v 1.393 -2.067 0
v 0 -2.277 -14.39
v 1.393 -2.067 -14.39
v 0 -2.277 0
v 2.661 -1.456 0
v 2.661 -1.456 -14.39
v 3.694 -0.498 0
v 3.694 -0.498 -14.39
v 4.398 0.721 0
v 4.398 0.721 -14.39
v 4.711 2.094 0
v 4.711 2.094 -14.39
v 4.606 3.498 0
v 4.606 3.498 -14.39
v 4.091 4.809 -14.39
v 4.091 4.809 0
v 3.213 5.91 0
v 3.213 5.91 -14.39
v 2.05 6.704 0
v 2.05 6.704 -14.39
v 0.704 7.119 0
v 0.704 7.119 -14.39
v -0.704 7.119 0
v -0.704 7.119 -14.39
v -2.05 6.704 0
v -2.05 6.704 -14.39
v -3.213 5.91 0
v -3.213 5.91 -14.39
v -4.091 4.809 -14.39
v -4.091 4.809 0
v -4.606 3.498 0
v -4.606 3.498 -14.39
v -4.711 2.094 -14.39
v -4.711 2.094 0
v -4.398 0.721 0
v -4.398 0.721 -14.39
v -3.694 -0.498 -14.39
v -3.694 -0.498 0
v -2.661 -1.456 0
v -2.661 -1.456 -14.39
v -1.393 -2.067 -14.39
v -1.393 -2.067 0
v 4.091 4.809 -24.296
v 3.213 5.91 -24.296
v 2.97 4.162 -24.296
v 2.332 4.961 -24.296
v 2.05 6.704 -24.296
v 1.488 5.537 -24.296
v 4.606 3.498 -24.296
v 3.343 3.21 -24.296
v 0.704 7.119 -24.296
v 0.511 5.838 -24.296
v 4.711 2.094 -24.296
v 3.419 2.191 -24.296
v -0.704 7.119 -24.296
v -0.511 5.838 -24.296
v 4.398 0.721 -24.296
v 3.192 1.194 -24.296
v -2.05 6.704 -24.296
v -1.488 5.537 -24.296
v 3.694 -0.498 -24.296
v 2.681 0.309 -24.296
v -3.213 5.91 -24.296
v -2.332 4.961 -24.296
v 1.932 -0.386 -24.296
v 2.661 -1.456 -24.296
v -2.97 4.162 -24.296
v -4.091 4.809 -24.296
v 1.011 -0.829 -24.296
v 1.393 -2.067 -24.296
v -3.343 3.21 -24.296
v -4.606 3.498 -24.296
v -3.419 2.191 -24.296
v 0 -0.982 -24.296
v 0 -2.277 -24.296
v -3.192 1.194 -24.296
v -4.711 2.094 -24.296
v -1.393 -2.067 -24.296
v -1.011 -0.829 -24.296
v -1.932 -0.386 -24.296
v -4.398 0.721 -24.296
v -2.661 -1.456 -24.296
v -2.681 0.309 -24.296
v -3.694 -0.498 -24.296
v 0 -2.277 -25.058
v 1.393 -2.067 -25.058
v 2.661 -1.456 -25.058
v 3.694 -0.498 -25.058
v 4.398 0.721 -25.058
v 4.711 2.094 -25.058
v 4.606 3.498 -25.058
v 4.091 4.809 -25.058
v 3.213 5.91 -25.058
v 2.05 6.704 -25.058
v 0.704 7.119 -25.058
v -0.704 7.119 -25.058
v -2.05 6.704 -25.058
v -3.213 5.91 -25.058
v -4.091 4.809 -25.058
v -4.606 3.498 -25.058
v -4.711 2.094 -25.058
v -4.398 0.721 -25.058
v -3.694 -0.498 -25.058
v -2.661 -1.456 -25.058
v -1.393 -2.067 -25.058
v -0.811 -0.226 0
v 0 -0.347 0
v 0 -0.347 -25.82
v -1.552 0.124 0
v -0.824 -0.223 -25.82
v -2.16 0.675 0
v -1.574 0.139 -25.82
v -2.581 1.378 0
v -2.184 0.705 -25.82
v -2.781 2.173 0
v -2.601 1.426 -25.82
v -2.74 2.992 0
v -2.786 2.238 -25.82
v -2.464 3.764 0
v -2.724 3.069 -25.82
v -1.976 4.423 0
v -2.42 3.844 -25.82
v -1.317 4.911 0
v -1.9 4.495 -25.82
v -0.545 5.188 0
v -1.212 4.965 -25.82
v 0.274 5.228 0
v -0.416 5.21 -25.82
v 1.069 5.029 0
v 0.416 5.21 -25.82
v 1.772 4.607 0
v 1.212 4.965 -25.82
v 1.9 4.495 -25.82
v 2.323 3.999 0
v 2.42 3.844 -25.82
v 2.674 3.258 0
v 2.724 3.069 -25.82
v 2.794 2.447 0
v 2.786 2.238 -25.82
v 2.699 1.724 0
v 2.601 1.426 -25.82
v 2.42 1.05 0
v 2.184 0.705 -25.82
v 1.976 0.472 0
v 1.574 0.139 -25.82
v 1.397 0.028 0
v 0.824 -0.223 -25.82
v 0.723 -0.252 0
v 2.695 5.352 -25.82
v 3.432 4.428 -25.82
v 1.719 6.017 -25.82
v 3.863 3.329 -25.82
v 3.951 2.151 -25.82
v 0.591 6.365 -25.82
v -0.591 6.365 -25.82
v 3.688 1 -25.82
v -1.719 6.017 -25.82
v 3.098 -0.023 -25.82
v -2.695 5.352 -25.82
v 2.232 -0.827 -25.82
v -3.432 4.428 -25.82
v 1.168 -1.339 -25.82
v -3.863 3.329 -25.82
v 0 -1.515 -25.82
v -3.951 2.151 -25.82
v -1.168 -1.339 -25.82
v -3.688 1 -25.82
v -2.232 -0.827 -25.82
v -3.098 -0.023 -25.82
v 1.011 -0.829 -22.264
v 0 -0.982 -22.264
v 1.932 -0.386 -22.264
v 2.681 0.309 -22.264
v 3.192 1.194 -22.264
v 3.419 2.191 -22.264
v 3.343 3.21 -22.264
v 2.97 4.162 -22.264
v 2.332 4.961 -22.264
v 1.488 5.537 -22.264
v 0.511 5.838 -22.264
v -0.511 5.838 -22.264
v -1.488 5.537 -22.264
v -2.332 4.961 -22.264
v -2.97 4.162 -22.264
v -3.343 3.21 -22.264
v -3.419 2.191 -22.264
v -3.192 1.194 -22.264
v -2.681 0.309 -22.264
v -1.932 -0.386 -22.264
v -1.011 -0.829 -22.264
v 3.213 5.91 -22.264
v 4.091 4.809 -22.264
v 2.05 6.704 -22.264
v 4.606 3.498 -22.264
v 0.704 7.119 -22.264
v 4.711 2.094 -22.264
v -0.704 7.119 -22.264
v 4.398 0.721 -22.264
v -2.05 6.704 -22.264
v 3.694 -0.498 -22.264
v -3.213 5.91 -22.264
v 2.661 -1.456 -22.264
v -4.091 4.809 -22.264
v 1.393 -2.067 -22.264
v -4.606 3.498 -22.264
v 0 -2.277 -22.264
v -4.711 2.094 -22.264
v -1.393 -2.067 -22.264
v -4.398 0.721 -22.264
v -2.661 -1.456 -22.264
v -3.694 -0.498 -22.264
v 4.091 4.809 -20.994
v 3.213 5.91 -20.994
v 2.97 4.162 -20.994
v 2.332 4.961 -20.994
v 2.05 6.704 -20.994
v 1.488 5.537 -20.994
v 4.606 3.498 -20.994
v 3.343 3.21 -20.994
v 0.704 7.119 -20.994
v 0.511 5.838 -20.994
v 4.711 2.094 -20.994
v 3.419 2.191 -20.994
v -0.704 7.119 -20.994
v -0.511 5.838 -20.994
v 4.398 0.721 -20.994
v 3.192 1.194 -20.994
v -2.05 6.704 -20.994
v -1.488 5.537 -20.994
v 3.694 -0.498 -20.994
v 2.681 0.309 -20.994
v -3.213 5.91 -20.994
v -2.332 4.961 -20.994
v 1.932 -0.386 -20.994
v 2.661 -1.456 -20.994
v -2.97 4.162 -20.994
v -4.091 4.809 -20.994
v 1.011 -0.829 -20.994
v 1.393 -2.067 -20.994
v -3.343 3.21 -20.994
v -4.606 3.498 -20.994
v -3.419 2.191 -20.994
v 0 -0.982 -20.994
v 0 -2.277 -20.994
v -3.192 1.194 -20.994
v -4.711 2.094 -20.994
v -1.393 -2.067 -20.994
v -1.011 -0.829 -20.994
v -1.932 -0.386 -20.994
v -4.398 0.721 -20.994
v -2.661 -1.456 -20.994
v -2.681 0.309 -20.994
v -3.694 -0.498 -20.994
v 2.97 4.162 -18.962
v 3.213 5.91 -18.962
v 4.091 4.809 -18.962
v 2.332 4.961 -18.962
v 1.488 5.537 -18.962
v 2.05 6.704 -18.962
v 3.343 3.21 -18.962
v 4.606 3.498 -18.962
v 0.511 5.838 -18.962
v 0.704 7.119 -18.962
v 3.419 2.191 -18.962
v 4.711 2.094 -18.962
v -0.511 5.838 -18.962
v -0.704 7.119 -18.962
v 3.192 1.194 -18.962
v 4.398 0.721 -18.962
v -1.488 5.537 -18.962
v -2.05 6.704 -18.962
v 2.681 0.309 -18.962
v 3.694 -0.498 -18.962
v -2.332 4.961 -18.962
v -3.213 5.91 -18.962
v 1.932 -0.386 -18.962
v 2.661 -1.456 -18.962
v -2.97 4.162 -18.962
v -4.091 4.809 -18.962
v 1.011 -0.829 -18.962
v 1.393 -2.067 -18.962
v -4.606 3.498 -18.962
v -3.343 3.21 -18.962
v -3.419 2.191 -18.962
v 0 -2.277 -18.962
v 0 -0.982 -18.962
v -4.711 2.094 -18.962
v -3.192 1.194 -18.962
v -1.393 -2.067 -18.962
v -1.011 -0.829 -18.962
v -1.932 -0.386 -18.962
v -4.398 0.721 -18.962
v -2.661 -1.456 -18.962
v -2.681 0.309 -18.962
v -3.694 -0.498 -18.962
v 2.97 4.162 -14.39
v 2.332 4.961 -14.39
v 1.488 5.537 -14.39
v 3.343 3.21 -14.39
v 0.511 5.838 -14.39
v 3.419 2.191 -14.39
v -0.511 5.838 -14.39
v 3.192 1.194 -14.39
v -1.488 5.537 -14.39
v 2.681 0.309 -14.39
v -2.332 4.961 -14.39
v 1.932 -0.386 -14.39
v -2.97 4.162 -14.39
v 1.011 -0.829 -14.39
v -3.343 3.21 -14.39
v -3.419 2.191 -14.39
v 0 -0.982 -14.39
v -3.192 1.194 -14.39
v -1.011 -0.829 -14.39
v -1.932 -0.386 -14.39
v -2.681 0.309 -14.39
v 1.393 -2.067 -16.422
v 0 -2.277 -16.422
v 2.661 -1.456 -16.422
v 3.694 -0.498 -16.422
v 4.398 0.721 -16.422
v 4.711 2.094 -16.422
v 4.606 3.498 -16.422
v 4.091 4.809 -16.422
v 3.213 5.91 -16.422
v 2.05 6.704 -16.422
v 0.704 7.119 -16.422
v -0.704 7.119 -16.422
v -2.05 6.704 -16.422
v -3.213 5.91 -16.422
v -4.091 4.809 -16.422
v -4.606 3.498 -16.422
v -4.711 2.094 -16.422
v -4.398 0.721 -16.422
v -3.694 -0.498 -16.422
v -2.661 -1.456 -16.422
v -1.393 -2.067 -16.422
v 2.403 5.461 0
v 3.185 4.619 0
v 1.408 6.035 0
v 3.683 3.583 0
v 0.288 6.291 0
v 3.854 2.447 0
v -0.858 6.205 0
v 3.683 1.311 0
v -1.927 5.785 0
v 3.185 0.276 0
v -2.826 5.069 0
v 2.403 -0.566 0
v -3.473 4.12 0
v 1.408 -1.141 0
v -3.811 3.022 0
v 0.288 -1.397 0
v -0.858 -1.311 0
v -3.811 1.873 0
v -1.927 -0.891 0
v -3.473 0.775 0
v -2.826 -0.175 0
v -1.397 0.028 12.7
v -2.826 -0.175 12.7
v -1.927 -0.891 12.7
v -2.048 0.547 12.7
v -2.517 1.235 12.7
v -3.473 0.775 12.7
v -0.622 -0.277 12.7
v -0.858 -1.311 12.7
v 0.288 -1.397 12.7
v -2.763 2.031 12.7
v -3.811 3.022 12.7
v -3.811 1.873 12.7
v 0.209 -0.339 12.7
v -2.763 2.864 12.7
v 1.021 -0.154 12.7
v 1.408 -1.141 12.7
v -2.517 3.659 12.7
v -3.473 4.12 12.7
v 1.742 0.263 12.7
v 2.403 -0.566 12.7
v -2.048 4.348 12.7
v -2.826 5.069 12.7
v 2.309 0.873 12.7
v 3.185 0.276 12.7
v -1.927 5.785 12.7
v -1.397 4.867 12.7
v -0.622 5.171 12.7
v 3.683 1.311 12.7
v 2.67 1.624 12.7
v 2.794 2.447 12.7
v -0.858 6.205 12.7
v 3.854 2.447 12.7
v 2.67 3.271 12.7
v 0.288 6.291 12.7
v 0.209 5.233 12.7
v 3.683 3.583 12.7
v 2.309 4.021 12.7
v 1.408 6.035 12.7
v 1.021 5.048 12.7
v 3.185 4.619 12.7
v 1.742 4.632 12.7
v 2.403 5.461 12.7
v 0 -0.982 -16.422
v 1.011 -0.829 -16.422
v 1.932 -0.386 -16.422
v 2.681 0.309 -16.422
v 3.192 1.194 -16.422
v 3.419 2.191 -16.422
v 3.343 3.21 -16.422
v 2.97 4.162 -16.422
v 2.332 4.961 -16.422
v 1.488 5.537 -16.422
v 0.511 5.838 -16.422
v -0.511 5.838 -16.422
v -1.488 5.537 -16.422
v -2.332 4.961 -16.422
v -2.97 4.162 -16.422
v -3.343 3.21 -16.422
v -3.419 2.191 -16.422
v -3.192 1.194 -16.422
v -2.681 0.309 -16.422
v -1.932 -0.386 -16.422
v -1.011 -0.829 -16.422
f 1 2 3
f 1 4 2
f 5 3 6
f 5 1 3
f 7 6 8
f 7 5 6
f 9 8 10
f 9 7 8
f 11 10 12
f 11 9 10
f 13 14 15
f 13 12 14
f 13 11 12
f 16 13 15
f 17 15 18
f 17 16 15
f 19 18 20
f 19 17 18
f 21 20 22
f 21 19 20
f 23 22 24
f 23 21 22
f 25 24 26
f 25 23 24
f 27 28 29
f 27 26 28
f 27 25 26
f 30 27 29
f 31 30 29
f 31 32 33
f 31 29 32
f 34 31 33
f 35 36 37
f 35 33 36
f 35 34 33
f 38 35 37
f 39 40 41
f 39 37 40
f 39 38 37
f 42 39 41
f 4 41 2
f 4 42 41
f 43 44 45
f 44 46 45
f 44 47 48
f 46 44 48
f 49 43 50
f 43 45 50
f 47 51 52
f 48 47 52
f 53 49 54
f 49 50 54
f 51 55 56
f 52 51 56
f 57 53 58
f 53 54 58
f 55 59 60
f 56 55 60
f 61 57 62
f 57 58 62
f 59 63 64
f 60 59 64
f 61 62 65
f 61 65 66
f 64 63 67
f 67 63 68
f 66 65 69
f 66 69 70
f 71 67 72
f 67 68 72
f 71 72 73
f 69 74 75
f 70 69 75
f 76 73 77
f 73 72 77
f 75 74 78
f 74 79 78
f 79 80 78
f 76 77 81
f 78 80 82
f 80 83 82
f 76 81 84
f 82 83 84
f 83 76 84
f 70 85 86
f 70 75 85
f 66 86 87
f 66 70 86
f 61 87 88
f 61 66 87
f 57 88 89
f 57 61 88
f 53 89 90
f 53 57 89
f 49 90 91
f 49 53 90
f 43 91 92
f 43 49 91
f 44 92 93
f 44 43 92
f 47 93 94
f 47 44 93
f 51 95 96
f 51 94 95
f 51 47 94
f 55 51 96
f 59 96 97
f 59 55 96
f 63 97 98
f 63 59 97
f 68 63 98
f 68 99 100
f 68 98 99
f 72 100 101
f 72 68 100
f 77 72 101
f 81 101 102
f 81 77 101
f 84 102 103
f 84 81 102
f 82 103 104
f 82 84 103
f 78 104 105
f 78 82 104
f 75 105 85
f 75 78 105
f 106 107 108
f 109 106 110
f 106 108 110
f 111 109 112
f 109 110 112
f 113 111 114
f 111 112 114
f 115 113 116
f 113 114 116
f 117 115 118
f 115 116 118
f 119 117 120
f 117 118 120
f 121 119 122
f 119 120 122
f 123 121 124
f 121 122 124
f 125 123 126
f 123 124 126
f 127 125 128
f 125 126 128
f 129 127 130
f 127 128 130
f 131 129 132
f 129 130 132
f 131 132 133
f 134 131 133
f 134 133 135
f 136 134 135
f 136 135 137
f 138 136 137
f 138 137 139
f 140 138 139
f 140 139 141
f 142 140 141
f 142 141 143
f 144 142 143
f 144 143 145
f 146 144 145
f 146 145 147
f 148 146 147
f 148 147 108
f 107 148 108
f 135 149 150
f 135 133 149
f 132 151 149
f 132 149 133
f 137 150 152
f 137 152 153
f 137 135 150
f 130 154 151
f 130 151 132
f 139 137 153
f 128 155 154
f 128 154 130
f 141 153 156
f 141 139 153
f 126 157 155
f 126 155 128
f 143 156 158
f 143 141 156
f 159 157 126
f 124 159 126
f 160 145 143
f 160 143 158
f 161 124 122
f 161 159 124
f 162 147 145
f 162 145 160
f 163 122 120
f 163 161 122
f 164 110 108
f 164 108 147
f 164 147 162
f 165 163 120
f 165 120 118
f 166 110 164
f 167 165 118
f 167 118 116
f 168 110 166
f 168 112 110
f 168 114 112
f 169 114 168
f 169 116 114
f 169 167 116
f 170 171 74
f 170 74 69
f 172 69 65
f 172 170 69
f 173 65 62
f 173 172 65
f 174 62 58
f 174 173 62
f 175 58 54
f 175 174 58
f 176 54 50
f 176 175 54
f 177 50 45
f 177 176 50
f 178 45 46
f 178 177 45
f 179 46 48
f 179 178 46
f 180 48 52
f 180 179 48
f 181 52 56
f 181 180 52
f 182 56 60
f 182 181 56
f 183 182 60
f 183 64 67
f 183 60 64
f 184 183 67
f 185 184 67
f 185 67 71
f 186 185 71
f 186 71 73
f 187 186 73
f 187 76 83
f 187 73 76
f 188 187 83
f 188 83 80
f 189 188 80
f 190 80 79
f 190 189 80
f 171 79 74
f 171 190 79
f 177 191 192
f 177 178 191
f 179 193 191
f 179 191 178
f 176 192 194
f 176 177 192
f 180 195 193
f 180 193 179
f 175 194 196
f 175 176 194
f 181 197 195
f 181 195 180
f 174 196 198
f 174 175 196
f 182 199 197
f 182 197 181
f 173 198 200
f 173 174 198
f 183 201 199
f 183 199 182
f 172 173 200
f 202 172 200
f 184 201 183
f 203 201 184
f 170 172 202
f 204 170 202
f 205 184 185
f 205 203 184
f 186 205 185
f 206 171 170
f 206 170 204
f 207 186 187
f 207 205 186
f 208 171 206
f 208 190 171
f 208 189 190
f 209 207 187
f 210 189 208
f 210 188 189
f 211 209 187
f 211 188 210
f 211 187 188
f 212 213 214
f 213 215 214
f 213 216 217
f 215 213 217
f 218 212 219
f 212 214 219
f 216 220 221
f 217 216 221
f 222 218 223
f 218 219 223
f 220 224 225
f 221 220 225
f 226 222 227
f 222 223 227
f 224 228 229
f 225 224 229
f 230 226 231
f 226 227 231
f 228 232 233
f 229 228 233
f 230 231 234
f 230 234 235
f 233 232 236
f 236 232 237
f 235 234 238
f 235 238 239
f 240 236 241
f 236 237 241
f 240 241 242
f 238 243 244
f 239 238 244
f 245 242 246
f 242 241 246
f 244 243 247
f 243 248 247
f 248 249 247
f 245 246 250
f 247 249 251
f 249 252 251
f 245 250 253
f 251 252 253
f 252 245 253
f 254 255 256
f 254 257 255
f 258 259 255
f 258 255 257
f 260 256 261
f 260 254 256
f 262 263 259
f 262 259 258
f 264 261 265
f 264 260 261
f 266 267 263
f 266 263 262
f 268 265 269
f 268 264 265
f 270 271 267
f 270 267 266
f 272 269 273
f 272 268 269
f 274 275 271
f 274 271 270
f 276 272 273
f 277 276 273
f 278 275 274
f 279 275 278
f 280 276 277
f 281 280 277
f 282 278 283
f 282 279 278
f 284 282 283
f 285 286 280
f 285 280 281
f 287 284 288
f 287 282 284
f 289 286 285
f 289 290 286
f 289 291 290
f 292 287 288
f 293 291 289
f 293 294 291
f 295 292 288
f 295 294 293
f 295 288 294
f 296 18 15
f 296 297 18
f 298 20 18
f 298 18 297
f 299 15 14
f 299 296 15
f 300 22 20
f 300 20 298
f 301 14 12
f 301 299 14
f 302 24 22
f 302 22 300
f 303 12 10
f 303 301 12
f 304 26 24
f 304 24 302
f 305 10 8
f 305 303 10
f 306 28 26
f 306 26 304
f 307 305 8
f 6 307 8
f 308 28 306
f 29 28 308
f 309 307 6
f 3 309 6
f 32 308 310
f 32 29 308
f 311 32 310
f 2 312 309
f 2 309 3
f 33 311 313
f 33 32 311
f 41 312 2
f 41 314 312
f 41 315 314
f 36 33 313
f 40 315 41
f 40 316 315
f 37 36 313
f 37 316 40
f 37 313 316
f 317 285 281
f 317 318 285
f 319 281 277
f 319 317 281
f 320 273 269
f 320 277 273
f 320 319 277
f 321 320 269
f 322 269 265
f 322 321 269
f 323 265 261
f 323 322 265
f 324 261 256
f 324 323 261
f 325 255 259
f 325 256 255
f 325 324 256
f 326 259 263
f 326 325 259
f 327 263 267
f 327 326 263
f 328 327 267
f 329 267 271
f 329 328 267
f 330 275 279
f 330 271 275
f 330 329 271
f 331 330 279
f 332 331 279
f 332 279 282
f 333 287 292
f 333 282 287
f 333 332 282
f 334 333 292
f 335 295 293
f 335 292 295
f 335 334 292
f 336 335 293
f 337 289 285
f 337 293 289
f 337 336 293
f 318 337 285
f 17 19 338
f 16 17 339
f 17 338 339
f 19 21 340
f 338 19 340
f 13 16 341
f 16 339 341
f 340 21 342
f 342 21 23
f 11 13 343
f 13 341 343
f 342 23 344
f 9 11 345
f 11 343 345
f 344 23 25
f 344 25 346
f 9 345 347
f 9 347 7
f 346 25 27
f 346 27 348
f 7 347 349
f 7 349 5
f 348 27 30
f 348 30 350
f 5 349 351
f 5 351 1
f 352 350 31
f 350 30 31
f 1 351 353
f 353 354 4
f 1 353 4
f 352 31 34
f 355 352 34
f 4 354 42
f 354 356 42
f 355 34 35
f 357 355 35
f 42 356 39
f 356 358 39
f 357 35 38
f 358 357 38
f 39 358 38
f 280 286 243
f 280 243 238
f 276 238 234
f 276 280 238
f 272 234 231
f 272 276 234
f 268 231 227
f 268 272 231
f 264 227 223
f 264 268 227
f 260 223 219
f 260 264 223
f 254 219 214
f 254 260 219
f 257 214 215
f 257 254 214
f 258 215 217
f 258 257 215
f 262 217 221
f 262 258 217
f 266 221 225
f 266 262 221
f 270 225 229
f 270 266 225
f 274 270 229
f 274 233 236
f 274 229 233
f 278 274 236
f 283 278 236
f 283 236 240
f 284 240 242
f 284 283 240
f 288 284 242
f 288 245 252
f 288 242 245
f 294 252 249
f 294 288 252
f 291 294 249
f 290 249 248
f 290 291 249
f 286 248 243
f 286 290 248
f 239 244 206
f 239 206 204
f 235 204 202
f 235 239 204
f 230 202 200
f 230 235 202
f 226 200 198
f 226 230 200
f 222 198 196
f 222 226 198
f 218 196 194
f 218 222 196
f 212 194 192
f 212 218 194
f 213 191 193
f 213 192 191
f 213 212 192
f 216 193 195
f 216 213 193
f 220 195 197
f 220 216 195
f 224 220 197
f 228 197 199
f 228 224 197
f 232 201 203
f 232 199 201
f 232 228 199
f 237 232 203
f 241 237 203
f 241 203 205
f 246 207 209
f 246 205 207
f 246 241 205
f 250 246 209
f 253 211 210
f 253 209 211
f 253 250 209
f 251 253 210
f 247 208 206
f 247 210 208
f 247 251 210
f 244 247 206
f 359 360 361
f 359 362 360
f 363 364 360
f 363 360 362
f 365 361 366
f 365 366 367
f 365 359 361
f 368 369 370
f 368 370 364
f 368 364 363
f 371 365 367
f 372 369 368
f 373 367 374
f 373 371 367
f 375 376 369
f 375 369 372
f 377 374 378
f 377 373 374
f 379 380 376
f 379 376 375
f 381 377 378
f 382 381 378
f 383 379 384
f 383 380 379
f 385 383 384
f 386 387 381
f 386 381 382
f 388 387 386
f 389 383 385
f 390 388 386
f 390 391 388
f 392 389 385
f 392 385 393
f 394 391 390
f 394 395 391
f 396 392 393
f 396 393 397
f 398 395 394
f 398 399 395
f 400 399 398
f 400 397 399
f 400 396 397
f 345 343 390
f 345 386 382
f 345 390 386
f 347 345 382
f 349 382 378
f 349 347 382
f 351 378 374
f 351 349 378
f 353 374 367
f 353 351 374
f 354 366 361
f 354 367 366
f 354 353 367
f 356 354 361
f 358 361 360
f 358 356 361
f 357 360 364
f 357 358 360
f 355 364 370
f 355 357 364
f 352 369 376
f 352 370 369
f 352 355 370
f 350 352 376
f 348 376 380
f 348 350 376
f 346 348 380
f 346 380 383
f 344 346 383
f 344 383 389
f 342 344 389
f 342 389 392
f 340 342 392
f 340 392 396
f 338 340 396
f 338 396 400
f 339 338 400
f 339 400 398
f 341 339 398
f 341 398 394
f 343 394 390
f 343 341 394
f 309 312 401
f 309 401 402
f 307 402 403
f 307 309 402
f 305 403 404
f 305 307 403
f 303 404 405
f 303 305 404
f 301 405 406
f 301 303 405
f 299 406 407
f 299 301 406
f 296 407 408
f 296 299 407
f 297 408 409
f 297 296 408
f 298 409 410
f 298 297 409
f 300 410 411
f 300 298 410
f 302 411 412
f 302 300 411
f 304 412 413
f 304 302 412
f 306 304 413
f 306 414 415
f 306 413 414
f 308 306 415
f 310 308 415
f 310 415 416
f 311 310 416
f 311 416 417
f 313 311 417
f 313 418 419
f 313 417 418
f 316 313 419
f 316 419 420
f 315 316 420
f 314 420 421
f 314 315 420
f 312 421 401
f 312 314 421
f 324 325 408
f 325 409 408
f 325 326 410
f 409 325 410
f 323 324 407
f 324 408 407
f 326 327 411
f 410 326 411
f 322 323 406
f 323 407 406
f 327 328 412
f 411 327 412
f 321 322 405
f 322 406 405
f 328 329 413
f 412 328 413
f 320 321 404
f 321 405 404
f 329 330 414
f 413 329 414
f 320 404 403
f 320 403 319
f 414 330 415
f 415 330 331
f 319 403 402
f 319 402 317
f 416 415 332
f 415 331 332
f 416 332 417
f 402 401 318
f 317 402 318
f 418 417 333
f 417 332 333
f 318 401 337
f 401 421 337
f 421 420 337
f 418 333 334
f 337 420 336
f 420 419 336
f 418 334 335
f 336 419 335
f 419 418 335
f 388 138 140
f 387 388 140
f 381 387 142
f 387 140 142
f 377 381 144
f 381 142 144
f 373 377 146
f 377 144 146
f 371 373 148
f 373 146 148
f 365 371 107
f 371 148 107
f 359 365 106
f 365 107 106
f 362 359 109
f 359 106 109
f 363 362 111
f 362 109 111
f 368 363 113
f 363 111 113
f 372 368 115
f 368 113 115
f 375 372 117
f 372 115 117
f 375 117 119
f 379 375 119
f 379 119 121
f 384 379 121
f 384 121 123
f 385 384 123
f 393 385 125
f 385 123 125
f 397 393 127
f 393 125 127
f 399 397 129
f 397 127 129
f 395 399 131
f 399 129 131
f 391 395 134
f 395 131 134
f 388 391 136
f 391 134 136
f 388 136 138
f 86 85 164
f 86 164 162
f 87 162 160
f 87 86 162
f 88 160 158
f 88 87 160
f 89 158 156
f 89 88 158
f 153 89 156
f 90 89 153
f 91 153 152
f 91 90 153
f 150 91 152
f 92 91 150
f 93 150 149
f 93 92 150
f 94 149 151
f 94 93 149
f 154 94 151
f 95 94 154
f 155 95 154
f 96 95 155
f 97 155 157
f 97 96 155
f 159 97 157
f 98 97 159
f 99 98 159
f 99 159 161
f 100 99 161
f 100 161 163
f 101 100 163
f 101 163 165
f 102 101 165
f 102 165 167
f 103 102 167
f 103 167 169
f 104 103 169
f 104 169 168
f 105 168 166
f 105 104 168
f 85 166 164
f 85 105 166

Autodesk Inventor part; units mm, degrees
ref_plane "YZ Plane" through (0, 0, 0) normal (1, 0, 0) x (0, 1, 0)
ref_plane "XZ Plane" through (0, 0, 0) normal (0, 1, 0) x (-1, 0, 0)
ref_plane "XY Plane" through (0, 0, 0) normal (0, 0, 1) x (1, 0, 0)
sketch "Sketch1" plane through (0, 0, 0) normal (1, 0, 0) x (0, 1, 0)
  line L0 (-2.3153, 0) -> (7.2097, 0) projected
  line L1 (7.2097, -18.2) -> (-2.3153, -18.2) projected
  line L2 (2.4472, 0) -> (2.4472, -25.82)
  line L3 (-0.3468, 0) -> (-0.3468, -25.82)
  line L4 (-0.3468, -25.82) -> (-2.2772, -25.82)
  line L5 (-2.2772, -25.82) -> (-2.2772, 0)
  line L6 (-2.2772, 0) -> (-0.3468, 0)
  line L7 (-2.2772, -24.296) -> (-0.9818, -24.296)
  line L8 (-0.9818, -24.296) -> (-0.9818, -22.264)
  line L9 (-0.9818, -22.264) -> (-2.2772, -22.264)
  line L10 (-2.2772, -22.264) -> (-2.2772, -24.296)
  line L11 (-2.2772, -20.994) -> (-0.9818, -20.994)
  line L12 (-0.9818, -20.994) -> (-0.9818, -18.962)
  line L13 (-0.9818, -18.962) -> (-2.2772, -18.962)
  line L14 (-2.2772, -18.962) -> (-2.2772, -20.994)
  line L15 (-2.2772, -16.422) -> (-0.9818, -16.422)
  line L16 (-0.9818, -16.422) -> (-0.9818, -14.39)
  line L17 (-0.9818, -14.39) -> (-2.2772, -14.39)
  line L18 (-2.2772, -14.39) -> (-2.2772, -16.422)
  point P0 (0, 0)
  dimension "d0" = 7.62
  dimension "d1" = 5.588
  dimension "d2" = 9.4488
  dimension "d3" = 2.032
  dimension "d4" = 1.27
  dimension "d5" = 2.032
  dimension "d6" = 0.635
  dimension "d7" = 1.524
  dimension "d8" = 2.54
  dimension "d9" = 2.032
revolve "Revolution1" add sketch "Sketch1" angle 360 about axis through (0, 2.4472, 0) along (0, 0, -1) contours L0 L3 L1 L5 L15 L16 L17 | L3 L4 L5 L7 L8 L9 L11 L12 L13 L1
chamfer "Chamfer1" distance 0.762 angle 45 1 edges at (0, 7.1716, -25.82)
sketch "Sketch5" plane through (0, 2.4472, 0) normal (0, 0, 1) x (1, 0, 0)
  circle A0 centre (0, 0) radius 4.7244 projected
  circle A1 centre (0, 0) radius 2.794 projected
  circle A2 centre (0, 0) radius 3.8545
  point P0 (0, -2.4472)
  dimension "d22" = 0.87
extrude "Extrusion2" add sketch "Sketch5" along normal blind 12.7 contours A2
equation "\"d5\" = d3"
equation "\"d9\" = d3"
properties part number "11310_Pipe Inserts_V1" material "Stainless Steel, Austenitic"
